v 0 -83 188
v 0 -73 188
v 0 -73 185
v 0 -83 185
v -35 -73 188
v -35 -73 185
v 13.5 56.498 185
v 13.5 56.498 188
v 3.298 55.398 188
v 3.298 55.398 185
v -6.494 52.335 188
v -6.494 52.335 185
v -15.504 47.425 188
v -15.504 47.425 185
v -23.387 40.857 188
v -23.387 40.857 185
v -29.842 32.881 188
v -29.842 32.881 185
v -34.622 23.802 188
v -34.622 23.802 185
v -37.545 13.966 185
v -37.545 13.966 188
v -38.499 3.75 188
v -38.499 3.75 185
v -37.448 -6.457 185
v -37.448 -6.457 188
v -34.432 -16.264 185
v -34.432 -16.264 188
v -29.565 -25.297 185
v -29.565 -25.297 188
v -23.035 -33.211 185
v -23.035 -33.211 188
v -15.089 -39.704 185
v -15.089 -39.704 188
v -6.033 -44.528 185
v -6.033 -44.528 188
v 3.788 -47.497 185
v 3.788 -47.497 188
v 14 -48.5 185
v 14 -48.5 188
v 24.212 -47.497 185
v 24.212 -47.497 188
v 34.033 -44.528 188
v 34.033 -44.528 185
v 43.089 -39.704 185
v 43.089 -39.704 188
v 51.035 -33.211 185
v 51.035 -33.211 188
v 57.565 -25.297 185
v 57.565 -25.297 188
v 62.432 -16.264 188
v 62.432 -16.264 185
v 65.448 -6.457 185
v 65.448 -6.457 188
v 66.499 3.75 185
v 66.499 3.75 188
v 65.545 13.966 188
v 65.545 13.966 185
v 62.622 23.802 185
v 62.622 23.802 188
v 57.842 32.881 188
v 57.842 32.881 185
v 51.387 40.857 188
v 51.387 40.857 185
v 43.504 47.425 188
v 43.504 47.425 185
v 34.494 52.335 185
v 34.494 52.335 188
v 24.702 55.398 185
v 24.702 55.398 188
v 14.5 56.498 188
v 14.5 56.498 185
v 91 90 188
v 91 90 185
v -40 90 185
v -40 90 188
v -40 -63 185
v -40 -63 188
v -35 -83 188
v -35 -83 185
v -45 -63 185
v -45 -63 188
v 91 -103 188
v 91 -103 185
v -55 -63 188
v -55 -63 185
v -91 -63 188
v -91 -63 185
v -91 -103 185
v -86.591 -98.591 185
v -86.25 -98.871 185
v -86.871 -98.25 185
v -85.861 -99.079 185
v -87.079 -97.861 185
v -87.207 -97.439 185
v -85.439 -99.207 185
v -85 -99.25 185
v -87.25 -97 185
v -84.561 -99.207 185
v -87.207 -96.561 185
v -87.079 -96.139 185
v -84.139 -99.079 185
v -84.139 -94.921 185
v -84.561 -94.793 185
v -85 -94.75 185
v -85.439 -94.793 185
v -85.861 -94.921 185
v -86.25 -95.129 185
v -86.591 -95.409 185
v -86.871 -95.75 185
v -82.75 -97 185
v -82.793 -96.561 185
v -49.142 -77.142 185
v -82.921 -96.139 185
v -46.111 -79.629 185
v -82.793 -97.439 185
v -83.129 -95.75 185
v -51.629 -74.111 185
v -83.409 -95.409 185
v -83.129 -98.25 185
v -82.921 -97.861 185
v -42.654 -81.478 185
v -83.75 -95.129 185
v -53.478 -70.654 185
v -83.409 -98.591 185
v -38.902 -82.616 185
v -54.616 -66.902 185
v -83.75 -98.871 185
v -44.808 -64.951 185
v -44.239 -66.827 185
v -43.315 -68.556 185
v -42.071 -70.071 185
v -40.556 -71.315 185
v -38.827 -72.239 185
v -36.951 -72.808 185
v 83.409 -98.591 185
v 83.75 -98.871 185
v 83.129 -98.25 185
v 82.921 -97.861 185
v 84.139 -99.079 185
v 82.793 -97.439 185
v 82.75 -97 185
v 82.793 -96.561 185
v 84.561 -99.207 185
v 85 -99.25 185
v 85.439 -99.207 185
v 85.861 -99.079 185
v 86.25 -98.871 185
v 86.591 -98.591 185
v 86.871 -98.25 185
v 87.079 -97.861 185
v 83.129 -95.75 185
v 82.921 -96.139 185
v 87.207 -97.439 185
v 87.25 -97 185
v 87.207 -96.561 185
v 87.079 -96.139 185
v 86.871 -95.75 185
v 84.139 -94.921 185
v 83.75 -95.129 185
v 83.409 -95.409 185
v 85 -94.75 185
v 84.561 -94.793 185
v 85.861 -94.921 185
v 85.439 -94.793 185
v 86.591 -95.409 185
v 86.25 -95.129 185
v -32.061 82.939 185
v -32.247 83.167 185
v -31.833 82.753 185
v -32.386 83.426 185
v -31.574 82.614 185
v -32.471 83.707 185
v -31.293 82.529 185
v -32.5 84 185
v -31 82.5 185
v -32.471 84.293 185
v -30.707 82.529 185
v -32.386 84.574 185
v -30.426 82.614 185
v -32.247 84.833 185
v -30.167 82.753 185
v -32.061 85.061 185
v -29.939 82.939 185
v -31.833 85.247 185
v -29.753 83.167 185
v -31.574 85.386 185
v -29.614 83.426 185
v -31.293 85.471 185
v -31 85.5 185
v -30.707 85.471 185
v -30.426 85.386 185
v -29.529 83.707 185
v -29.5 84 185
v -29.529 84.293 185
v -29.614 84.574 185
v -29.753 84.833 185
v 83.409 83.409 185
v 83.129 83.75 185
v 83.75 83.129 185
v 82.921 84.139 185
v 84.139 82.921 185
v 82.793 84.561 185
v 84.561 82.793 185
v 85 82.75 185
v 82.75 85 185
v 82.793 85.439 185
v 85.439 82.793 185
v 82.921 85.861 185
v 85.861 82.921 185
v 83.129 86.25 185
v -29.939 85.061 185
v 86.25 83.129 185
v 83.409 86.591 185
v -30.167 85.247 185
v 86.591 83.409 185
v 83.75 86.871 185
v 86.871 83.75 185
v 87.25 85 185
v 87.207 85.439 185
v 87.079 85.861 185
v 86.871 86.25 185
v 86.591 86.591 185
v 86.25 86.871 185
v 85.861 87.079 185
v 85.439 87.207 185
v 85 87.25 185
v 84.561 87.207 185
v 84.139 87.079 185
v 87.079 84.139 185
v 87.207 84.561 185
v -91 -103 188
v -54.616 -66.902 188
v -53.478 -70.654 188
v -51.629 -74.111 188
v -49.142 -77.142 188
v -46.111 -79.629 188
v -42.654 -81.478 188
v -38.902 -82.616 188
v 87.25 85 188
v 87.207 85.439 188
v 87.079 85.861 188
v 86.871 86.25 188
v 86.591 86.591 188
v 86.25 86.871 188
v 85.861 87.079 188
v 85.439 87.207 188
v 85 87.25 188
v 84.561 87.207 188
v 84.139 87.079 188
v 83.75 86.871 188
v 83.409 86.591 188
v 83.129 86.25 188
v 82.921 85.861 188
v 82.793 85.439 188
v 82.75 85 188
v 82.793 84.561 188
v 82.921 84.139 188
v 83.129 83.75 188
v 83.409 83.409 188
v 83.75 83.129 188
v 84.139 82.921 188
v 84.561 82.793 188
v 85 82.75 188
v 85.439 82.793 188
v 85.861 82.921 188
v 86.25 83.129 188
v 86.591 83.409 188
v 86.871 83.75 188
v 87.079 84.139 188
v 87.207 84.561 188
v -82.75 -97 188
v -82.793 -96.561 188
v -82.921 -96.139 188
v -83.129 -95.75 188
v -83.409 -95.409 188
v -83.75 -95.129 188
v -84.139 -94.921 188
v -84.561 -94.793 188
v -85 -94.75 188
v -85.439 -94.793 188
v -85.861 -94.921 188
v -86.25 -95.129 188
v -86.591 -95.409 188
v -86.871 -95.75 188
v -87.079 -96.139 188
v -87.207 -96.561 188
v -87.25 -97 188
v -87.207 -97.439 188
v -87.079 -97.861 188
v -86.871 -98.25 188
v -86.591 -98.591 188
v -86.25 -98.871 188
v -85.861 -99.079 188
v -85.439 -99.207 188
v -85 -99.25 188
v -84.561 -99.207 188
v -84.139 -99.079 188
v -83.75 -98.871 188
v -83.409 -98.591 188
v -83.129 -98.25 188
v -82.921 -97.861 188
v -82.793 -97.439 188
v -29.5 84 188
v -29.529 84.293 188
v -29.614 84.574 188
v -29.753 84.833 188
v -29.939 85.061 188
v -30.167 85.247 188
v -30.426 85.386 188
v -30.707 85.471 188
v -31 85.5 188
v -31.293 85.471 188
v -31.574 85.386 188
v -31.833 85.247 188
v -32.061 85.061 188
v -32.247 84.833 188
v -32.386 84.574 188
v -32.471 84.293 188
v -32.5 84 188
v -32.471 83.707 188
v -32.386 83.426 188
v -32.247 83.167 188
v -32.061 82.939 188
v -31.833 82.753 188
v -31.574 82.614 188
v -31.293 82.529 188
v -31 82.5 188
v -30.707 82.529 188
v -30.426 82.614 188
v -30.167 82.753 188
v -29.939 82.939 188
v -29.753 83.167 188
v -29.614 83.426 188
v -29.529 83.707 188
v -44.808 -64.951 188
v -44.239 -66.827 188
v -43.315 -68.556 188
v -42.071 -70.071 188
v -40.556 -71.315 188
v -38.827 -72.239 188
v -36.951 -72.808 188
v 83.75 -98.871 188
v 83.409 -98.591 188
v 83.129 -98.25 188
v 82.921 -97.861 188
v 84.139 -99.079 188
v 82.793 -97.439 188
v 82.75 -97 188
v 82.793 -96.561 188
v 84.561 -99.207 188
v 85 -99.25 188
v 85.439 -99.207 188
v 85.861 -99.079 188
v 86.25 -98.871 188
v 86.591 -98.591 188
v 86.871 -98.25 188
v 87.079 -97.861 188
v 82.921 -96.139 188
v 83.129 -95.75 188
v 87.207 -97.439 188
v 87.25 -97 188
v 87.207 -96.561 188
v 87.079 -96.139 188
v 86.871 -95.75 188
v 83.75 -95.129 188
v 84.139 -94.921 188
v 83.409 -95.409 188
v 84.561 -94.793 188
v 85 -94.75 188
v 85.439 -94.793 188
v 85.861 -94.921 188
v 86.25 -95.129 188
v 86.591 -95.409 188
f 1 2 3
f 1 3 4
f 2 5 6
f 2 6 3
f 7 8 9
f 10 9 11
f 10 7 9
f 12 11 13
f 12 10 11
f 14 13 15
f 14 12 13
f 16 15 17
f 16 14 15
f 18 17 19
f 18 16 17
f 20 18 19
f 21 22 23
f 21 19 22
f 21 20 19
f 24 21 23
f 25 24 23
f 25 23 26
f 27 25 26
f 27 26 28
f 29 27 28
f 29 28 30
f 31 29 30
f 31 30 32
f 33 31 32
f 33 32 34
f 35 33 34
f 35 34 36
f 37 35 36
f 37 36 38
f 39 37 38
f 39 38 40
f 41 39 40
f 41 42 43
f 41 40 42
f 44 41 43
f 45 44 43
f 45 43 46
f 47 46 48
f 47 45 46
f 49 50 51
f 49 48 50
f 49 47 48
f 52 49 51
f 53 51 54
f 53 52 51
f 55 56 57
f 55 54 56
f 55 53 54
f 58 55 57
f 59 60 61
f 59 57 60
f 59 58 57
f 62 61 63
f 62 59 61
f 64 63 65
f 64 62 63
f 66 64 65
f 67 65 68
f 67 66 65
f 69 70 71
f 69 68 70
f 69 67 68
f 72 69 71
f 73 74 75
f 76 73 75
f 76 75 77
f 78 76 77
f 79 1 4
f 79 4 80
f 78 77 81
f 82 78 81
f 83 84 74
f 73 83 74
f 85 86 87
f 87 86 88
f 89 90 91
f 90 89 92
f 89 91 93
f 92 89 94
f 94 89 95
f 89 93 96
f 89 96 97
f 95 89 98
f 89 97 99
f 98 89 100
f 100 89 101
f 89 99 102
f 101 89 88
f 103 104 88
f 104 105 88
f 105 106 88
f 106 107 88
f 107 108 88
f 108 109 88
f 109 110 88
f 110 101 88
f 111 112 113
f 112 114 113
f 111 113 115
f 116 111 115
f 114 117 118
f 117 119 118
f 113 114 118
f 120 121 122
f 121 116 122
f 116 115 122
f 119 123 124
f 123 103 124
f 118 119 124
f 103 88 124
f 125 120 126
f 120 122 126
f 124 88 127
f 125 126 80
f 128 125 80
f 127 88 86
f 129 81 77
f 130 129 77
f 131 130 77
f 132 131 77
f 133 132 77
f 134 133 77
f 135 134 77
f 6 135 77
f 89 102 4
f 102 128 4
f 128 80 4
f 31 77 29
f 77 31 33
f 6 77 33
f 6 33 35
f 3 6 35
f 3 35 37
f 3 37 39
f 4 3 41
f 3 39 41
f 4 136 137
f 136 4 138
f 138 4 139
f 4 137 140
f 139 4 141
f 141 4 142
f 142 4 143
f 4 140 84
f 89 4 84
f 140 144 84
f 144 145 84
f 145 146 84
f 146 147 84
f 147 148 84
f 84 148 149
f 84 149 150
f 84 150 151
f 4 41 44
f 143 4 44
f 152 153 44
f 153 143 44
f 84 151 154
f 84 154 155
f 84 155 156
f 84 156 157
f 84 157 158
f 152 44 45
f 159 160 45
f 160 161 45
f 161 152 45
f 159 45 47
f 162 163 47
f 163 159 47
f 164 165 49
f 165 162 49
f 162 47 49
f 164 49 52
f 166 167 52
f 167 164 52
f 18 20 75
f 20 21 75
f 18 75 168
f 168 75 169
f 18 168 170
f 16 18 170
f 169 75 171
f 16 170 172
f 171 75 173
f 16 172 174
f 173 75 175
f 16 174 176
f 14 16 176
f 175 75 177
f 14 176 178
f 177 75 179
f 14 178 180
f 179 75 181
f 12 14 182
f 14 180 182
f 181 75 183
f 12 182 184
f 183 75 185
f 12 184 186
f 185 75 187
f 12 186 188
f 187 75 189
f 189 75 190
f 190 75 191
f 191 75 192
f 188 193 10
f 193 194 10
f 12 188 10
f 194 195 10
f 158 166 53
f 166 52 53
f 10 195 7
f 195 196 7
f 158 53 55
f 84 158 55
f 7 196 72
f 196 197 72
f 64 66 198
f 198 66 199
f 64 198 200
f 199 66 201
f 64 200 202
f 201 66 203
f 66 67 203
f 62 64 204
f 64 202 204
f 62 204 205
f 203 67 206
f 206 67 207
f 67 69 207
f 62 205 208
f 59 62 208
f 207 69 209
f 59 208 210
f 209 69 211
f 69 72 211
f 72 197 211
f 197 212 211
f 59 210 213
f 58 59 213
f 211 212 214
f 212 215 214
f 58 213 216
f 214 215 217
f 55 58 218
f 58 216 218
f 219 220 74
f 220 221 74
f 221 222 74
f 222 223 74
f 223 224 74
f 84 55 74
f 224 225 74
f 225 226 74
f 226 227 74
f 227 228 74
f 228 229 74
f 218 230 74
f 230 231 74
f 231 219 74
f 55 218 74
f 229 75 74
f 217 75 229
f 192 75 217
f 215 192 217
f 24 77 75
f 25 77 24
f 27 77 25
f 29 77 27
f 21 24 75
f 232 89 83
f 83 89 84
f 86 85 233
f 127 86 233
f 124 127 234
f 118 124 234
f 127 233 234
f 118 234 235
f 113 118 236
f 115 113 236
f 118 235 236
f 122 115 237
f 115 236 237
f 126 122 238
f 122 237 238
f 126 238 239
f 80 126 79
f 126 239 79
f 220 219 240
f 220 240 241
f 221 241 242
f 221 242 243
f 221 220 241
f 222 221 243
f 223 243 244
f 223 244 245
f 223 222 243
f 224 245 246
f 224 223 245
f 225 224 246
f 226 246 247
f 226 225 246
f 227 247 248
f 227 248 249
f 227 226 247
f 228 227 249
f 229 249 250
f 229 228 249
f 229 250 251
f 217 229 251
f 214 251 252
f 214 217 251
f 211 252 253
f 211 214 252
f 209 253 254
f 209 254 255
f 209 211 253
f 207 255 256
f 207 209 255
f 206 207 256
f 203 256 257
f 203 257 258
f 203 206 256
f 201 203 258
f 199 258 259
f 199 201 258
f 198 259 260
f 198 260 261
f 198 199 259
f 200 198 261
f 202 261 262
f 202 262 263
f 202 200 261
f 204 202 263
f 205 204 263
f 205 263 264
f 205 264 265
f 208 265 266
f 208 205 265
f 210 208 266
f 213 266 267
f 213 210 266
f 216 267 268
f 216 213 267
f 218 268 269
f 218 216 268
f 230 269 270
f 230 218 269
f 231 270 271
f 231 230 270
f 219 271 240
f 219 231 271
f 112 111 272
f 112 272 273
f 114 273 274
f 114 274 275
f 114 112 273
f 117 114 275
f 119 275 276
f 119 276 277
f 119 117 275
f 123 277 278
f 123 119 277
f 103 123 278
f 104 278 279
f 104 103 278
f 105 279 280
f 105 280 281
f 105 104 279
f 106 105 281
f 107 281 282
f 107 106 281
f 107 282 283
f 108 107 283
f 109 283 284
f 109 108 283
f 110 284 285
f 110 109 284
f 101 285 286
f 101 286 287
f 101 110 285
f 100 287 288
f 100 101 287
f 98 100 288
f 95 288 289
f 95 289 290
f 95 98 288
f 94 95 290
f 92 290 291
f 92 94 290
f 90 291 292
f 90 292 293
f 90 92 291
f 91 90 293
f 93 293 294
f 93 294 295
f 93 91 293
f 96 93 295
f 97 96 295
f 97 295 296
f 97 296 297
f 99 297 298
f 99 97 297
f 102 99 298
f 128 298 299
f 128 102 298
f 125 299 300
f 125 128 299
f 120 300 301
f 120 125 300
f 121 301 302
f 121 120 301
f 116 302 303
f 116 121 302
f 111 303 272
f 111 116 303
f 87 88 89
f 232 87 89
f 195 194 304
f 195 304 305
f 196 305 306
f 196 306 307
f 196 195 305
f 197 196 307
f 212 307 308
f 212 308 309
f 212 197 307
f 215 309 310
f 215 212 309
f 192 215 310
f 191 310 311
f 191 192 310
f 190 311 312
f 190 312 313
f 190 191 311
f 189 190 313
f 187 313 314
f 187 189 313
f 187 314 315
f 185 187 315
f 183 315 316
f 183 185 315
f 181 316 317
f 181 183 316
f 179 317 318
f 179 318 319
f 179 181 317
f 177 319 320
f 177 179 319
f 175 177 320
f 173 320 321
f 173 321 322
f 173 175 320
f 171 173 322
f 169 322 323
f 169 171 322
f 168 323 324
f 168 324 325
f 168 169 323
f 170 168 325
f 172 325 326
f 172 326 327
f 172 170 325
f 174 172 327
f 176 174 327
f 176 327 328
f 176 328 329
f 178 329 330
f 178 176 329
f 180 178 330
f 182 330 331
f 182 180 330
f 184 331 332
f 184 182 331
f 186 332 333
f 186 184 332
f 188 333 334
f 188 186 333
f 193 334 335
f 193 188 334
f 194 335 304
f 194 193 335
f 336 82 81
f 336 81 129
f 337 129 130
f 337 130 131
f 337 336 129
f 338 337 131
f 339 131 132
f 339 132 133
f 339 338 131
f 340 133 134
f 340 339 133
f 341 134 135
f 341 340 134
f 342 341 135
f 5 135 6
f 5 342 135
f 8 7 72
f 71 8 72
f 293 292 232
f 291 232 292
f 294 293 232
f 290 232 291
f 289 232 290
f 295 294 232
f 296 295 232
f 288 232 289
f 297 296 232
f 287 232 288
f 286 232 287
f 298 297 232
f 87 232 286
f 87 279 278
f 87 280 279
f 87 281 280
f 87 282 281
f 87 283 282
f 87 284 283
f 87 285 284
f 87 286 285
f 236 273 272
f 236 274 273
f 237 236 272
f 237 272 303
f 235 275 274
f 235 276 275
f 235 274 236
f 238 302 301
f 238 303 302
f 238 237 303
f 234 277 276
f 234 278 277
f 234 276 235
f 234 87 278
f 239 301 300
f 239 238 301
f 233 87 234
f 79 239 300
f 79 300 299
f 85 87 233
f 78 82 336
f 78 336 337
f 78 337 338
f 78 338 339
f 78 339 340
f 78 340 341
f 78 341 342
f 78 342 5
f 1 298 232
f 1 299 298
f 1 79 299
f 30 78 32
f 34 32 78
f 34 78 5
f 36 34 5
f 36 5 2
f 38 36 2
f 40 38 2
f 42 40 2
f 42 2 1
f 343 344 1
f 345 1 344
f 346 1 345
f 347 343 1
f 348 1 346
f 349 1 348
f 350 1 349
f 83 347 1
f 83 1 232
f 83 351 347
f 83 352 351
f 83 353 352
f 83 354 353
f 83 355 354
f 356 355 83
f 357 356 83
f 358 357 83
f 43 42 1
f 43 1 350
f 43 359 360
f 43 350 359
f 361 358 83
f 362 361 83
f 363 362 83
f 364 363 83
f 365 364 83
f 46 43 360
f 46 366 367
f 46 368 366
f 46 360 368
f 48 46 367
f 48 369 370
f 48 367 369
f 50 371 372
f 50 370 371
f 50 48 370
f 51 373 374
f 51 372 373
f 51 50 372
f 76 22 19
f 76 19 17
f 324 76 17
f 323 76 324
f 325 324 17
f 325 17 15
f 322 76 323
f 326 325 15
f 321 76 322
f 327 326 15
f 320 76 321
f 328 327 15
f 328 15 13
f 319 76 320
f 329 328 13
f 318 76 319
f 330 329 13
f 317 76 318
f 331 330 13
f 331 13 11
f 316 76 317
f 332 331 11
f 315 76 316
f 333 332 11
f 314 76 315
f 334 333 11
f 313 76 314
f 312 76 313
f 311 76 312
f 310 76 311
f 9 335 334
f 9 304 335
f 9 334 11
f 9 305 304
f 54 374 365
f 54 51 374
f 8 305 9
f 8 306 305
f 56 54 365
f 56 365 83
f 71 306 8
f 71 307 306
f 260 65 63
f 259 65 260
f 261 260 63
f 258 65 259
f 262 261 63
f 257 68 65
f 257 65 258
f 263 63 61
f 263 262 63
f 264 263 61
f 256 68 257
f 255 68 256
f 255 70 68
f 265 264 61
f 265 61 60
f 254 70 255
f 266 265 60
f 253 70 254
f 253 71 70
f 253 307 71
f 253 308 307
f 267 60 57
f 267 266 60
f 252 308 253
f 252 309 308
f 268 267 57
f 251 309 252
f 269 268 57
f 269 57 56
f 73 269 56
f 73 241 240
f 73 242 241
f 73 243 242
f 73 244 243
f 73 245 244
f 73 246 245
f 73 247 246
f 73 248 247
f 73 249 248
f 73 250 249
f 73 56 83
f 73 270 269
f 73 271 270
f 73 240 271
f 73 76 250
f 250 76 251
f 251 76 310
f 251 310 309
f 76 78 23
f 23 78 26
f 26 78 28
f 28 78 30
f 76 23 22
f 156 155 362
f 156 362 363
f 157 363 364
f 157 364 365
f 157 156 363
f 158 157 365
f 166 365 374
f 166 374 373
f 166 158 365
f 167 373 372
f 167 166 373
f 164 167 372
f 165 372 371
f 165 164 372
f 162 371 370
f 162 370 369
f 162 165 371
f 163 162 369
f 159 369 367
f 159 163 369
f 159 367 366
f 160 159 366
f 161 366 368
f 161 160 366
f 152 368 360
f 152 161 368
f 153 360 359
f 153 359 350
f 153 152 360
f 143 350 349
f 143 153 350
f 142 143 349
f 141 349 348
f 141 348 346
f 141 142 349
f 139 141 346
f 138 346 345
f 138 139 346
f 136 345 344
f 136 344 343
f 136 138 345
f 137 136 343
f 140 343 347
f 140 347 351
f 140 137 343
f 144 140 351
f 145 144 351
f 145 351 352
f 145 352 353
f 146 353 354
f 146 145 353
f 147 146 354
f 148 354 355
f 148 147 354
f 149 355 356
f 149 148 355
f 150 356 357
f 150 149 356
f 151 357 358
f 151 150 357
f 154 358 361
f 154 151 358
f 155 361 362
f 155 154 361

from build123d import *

# Parameters (mm, degrees)
SKETCH259_R          = 2.25
SKETCH259_R_2        = 1.5
PAD029_DEPTH         = 3
POCKET019_DEPTH      = 0.001
POCKET019_DEPTH_BACK = 3.001
POCKET020_DEPTH      = 5


with BuildPart() as part:
    # Sketch259 → Pad029 (new body)
    with BuildSketch(Plane.XY):
        Polygon((91, 90), (-40, 90), (-40, -63), (-91, -63), (-91, -103), (91, -103), align=None)
        with Locations((85, 85)):
            Circle(SKETCH259_R, mode=Mode.SUBTRACT)
        with Locations((85, -97)):
            Circle(SKETCH259_R, mode=Mode.SUBTRACT)
        with Locations((-85, -97)):
            Circle(SKETCH259_R, mode=Mode.SUBTRACT)
        with Locations((-31, 84)):
            Circle(SKETCH259_R_2, mode=Mode.SUBTRACT)
    extrude(amount=PAD029_DEPTH)

    # Sketch258 → Pocket019 (cut, two sides)
    with BuildSketch(Plane.XY) as pocket019_sk:
        with BuildLine():
            ThreePointArc((13.5, 56.497619), (14, -48.5), (14.5, 56.497619))
            Line((13.5, 56.497619), (14.5, 56.497619))
        make_face()
    extrude(amount=-POCKET019_DEPTH, mode=Mode.SUBTRACT)
    extrude(pocket019_sk.sketch, amount=POCKET019_DEPTH_BACK, mode=Mode.SUBTRACT)

    # Sketch260 → Pocket020 (cut)
    with BuildSketch(Plane.XY.offset(3)):
        with BuildLine():
            ThreePointArc((-55, -63), (-49.142136, -77.142136), (-35, -83))
            Line((0, -83), (-35, -83))
            Line((0, -73), (0, -83))
            Line((-35, -73), (0, -73))
            ThreePointArc((-45, -63), (-42.071068, -70.071068), (-35, -73))
            Line((-55, -63), (-45, -63))
        make_face()
    extrude(amount=-POCKET020_DEPTH, mode=Mode.SUBTRACT)


with BuildPart() as part_1:
    # Body013 placement: moved
    add(part.part.moved(Location((0, 0, 185))))


solid = part_1.part
